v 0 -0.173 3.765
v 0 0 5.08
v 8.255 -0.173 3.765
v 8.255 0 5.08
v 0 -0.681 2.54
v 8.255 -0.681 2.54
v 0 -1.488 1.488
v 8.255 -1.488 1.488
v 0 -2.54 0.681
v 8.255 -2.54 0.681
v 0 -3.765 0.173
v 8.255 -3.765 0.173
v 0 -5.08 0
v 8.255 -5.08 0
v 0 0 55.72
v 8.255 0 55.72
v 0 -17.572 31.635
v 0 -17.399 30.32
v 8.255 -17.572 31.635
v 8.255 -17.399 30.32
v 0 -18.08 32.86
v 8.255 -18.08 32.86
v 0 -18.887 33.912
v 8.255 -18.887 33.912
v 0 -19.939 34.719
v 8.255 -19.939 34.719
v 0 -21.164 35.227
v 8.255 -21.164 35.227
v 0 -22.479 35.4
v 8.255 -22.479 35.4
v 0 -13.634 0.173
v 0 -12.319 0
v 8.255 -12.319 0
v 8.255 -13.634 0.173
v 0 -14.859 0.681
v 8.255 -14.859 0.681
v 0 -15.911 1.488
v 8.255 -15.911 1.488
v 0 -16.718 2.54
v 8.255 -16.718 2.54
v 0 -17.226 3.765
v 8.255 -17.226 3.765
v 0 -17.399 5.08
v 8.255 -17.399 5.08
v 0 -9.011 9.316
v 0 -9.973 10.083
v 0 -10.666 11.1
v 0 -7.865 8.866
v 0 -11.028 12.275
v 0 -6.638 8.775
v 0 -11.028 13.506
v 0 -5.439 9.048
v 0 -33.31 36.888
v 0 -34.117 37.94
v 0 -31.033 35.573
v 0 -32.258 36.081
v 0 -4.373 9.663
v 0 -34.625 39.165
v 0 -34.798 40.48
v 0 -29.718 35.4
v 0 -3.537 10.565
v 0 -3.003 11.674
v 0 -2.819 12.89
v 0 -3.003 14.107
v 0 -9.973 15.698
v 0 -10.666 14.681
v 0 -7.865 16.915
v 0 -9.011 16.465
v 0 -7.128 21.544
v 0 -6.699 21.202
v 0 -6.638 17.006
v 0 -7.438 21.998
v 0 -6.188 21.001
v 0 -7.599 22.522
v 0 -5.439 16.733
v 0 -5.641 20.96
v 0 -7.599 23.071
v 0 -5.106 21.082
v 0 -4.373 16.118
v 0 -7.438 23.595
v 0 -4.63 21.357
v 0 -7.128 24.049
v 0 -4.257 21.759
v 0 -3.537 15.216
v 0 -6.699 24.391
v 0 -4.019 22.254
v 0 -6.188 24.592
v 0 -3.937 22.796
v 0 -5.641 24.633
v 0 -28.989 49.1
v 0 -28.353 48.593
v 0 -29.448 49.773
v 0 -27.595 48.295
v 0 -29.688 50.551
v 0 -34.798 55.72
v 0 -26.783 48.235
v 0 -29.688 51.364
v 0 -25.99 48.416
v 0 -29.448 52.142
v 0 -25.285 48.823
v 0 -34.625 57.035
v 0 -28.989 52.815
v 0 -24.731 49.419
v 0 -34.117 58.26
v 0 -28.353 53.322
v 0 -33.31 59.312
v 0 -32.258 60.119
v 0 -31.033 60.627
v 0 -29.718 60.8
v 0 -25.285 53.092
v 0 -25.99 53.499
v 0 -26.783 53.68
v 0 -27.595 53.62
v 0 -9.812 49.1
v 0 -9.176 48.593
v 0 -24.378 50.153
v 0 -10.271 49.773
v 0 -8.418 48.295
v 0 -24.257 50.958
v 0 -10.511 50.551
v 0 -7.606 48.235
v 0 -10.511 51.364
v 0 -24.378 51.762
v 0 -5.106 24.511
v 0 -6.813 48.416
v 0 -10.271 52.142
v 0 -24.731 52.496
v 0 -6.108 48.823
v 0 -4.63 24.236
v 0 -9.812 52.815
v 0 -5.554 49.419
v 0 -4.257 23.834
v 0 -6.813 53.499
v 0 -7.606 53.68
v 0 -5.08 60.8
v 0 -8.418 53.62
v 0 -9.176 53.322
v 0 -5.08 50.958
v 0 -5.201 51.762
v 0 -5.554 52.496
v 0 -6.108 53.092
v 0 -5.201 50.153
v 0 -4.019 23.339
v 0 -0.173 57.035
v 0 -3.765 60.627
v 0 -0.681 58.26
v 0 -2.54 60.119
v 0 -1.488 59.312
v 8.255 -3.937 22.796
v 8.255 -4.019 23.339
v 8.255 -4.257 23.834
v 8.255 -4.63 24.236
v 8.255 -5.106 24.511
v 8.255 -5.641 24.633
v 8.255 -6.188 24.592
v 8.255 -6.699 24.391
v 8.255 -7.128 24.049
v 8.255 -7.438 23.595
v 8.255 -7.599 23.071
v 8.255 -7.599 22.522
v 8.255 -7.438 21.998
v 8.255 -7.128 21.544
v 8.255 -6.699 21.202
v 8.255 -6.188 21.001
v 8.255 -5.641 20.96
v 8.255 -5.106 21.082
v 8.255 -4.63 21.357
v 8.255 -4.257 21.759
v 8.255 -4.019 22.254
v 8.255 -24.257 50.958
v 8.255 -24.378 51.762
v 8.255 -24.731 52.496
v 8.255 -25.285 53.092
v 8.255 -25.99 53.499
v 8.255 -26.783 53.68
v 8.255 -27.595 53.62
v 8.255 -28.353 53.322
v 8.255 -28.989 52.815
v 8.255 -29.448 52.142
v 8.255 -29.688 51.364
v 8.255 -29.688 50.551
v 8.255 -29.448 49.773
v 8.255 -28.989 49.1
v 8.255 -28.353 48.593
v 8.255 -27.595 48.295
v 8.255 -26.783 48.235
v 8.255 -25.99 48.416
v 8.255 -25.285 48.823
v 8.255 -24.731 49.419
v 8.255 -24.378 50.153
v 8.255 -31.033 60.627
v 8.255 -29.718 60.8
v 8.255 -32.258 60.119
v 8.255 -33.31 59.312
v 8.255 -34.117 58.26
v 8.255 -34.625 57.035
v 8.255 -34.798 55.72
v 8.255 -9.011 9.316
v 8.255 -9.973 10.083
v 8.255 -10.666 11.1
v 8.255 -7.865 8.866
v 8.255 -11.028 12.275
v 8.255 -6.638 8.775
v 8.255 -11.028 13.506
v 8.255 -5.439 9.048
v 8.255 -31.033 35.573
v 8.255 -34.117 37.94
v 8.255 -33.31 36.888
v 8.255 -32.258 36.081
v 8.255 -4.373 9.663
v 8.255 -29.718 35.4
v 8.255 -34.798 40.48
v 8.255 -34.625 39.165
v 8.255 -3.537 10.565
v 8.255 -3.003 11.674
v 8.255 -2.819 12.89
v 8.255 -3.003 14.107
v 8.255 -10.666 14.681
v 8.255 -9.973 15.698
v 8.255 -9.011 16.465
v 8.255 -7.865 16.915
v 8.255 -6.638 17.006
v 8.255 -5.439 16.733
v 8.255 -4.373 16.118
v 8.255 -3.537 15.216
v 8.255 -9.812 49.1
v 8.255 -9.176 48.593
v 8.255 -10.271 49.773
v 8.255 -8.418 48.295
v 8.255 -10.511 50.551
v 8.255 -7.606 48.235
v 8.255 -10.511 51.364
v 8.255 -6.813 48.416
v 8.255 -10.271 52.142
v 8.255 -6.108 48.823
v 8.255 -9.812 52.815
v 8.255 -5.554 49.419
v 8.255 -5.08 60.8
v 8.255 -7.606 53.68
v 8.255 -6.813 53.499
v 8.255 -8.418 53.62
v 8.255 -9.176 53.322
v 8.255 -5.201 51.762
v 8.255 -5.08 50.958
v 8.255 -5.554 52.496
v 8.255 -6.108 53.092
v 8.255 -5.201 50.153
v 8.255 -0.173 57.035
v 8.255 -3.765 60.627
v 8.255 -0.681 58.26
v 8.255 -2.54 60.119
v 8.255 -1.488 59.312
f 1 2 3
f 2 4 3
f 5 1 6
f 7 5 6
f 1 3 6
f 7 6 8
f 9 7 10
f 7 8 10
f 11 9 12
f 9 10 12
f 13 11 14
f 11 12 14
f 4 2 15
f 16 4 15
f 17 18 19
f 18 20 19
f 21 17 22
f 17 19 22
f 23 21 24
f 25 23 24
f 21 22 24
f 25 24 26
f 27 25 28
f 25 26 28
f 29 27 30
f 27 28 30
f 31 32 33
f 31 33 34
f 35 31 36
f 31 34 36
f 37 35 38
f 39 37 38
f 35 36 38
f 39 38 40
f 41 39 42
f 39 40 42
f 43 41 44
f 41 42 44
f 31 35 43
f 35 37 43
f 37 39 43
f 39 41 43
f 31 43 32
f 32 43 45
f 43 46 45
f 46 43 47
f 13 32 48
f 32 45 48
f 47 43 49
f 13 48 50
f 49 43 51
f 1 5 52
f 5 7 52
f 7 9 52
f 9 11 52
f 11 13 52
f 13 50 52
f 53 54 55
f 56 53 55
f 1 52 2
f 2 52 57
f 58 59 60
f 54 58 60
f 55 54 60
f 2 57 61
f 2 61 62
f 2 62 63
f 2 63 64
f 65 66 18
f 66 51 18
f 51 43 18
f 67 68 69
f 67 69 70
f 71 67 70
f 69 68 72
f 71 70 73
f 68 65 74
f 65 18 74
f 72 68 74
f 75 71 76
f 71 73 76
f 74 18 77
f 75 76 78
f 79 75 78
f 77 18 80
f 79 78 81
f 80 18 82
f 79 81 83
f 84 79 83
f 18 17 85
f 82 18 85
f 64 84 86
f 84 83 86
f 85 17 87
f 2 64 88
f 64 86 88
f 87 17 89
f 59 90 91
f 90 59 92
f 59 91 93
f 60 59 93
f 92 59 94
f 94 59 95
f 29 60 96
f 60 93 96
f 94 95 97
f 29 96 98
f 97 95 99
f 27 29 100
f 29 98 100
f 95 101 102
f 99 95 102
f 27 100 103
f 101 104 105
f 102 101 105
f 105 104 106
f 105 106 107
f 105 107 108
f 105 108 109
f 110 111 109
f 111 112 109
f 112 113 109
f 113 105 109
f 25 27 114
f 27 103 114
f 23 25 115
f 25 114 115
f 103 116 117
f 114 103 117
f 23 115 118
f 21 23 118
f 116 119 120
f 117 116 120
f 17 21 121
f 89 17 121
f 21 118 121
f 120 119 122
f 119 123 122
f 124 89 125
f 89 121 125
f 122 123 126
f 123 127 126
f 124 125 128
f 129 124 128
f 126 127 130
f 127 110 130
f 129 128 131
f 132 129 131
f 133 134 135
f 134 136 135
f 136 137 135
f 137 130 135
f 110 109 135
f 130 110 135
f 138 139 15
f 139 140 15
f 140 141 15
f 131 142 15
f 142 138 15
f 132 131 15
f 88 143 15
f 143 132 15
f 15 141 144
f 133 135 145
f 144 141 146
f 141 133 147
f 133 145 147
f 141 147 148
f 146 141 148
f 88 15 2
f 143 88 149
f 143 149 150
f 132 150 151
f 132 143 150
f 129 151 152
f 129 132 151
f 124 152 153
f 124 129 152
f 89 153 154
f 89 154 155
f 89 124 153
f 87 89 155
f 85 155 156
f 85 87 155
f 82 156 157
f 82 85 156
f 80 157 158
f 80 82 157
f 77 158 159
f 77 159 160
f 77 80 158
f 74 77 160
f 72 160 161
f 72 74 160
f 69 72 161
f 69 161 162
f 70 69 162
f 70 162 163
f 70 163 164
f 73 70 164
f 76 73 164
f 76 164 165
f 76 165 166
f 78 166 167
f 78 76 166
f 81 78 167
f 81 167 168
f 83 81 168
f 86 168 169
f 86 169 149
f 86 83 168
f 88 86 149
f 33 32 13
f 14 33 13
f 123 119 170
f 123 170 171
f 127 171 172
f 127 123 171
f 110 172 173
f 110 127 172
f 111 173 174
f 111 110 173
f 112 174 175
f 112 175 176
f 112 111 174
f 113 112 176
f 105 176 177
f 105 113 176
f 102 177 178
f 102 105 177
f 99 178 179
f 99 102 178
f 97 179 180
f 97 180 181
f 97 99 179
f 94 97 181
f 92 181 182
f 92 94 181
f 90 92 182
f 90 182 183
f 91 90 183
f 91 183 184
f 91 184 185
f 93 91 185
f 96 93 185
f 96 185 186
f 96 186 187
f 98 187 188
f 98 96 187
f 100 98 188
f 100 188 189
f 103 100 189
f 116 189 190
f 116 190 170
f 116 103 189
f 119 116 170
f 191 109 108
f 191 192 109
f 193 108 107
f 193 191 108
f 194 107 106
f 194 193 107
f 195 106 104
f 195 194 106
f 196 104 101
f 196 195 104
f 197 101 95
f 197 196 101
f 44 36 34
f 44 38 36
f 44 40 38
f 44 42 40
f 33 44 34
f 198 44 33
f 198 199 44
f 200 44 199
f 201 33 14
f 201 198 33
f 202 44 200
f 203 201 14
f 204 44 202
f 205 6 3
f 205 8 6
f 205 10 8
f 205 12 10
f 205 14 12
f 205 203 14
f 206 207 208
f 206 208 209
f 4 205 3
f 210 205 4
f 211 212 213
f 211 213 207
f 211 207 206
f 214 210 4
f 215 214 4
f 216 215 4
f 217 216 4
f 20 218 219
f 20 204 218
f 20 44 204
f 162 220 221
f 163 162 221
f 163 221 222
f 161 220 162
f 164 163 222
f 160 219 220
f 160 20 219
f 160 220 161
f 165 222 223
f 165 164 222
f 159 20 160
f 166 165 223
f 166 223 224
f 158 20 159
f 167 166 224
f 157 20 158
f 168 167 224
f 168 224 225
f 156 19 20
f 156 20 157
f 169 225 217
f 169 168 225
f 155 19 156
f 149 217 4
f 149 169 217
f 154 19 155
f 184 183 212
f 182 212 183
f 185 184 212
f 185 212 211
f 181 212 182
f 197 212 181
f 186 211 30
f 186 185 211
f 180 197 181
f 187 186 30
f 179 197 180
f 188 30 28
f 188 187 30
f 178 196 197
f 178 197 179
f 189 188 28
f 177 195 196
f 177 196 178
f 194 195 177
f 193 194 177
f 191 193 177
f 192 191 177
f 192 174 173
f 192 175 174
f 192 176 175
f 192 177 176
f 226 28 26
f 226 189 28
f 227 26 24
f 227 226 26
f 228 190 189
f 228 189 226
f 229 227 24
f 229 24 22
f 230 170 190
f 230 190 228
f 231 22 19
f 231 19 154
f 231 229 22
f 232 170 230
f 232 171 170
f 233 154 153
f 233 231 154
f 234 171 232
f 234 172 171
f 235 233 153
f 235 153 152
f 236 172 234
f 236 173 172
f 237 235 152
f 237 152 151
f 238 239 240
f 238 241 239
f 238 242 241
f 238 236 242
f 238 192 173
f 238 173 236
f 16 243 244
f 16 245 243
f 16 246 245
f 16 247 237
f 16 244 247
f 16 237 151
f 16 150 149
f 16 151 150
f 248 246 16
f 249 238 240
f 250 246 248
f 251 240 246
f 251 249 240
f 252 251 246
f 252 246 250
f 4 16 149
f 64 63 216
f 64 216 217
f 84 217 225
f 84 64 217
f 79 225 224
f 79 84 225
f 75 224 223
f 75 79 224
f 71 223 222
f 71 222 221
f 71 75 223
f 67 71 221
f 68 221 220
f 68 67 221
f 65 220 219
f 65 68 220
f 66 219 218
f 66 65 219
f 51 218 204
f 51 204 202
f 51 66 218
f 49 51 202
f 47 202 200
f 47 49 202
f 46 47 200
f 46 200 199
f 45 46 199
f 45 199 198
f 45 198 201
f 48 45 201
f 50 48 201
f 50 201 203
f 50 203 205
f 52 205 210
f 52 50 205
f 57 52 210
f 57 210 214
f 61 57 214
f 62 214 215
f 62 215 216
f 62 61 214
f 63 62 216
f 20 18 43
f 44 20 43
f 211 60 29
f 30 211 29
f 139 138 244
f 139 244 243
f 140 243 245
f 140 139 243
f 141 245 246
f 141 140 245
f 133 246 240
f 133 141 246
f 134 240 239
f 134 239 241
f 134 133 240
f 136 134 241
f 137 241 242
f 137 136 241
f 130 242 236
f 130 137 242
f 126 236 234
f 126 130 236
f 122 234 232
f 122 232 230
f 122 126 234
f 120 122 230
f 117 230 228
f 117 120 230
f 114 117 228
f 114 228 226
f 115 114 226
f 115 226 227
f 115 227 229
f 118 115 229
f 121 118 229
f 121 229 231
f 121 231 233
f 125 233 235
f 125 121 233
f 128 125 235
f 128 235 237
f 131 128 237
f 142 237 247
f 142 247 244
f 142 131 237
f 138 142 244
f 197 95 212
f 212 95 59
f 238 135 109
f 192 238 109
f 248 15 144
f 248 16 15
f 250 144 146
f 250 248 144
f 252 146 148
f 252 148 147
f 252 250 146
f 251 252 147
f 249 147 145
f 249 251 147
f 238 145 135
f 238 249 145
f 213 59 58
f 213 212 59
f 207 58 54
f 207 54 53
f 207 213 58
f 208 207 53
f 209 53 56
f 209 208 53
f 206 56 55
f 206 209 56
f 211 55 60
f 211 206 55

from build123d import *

# Parameters (mm, degrees)
F0_R     = 4.1275
F0_R_2   = 1.8415
F0_R_3   = 2.7305
F1_DEPTH = 8.255
F2_R     = 5.08
F3_R     = 5.08


with BuildPart() as f1:
    # F0 (on Right) → F1 (new body)
    with BuildSketch(Plane.YZ):
        Polygon((-17.399, 0), (0, 0), (0, 60.8), (-34.798, 60.8), (-34.798, 35.4), (-17.399, 35.4), align=None)
        with Locations((-6.9469, 12.8905)):
            Circle(F0_R, mode=Mode.SUBTRACT)
        with Locations((-5.7785, 22.7965)):
            Circle(F0_R_2, mode=Mode.SUBTRACT)
        with Locations((-26.9875, 50.9575)):
            Circle(F0_R_3, mode=Mode.SUBTRACT)
        with Locations((-7.8105, 50.9575)):
            Circle(F0_R_3, mode=Mode.SUBTRACT)
    extrude(amount=F1_DEPTH)

    # F2
    f2_edges = [f1.edges().sort_by_distance(p)[0] for p in [
        (4.1275, 0, 60.8),
    ]]
    fillet(f2_edges, radius=F2_R)

    # F3
    f3_edges = [f1.edges().sort_by_distance(p)[0] for p in [
        (4.1275, 0, 0),
        (4.1275, -17.399, 0),
        (4.1275, -17.399, 35.4),
        (4.1275, -34.798, 35.4),
        (4.1275, -34.798, 60.8),
    ]]
    fillet(f3_edges, radius=F3_R)


solid = f1.part
